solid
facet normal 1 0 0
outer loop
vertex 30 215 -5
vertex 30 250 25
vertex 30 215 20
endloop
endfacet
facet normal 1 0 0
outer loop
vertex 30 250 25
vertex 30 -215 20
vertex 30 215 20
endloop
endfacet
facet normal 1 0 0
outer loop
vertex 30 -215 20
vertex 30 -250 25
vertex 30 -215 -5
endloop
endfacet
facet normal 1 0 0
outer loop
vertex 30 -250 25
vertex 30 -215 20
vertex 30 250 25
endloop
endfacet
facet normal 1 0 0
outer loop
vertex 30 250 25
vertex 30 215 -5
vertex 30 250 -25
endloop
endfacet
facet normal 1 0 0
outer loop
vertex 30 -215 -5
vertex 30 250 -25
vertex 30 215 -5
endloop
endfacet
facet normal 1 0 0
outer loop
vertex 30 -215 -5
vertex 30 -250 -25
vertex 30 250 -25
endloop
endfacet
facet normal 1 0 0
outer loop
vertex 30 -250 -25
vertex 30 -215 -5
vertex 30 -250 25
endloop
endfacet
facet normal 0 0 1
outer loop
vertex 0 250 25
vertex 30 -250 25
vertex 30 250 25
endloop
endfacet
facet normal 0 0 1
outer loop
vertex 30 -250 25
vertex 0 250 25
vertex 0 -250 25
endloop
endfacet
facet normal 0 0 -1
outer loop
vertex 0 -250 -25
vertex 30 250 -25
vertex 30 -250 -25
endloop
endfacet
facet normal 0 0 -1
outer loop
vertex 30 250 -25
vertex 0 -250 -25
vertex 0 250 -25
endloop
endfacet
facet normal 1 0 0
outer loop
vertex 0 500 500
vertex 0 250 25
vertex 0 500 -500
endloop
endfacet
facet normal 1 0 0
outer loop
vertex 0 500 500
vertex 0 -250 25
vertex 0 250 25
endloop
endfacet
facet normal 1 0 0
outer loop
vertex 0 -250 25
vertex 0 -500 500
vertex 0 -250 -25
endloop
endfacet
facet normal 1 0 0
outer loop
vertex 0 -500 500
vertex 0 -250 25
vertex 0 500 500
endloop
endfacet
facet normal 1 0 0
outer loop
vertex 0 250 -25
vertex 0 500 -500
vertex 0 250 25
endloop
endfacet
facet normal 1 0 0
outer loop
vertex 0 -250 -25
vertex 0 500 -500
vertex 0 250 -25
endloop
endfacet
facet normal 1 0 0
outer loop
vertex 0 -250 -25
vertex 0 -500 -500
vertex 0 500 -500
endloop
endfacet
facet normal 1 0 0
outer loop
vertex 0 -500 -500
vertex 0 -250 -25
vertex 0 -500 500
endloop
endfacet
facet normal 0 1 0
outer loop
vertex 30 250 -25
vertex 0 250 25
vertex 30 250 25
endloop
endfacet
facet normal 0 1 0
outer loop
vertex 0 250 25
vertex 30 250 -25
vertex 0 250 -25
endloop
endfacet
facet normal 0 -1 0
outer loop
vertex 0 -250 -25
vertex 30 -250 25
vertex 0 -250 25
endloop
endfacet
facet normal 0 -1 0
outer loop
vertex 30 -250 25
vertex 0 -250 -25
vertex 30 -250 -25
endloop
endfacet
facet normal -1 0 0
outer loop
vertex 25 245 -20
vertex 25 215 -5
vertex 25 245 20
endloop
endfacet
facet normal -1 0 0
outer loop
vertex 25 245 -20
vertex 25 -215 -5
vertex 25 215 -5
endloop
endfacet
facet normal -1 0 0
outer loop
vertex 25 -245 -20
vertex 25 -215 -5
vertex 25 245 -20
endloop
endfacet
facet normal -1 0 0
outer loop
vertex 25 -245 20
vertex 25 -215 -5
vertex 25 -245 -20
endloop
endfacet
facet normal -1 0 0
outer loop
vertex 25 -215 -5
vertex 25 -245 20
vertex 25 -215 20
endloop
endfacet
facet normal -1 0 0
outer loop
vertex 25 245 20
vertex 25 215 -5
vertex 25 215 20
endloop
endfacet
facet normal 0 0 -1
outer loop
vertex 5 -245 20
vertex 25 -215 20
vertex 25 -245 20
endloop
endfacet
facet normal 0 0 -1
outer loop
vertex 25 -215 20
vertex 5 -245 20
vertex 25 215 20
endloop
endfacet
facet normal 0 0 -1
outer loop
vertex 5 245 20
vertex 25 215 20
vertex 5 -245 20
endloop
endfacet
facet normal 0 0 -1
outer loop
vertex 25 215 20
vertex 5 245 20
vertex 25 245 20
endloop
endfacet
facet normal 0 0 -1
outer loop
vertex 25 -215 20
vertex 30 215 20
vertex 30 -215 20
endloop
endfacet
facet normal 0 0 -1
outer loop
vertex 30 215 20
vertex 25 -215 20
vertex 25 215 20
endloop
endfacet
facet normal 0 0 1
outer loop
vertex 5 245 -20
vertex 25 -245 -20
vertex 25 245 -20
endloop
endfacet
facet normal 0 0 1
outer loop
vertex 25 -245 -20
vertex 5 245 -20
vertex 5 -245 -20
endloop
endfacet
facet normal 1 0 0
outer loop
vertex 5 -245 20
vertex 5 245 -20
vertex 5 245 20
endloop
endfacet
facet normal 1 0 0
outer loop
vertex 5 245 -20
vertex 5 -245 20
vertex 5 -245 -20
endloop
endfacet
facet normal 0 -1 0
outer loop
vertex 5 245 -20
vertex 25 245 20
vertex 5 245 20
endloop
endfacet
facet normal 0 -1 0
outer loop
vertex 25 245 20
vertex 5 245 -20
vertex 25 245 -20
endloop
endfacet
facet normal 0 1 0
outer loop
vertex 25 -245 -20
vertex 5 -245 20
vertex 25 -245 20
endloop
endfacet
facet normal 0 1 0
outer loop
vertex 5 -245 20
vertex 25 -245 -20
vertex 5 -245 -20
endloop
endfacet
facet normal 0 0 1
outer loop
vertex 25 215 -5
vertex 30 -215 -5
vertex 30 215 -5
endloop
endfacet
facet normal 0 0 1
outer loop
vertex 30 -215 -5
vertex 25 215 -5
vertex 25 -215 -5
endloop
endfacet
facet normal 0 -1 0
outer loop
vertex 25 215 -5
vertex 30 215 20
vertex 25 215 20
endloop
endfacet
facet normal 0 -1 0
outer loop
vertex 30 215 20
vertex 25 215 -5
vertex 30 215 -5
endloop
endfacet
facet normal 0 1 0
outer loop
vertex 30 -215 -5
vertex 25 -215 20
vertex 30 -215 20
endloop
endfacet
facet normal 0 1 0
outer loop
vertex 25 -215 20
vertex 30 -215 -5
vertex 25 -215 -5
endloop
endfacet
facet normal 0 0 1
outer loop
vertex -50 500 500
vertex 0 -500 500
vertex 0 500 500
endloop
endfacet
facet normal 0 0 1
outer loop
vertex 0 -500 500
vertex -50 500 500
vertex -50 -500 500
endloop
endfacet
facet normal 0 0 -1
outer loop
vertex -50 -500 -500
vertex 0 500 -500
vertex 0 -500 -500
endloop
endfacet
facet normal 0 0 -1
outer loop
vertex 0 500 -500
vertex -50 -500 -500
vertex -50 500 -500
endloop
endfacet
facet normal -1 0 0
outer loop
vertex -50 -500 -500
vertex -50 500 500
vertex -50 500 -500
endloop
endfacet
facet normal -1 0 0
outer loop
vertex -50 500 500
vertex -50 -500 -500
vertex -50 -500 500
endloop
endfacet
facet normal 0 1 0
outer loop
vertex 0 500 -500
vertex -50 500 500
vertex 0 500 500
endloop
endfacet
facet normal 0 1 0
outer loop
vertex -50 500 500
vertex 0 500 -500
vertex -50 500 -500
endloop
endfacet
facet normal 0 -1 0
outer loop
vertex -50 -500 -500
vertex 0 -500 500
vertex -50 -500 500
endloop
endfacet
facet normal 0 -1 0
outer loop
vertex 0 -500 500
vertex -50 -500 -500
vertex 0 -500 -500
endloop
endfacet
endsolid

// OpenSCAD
motorWidth = 30;

module wall () {
	depth = 50;

	color("white")
	translate([-(depth/2), 0, 0])
	cube(size=[depth, 1000, 1000], center=true);
}

module clock () {

	module hull () {

		height = 50;
		depth = 30;
		width = 500;
		thickness = 5;
		hollow = [
			depth - (2 * thickness),
			width - (2 * thickness),
			height - (2 * thickness)
		];

		windowHeight = height / 2;
		windowWidth = width - (2 * motorWidth) - (2 * thickness);

		translate([depth/2, 0, 0])
		difference () {
			cube(size=[depth, width, height], center=true);
			cube(size=hollow, center=true);
			translate([depth/2, 0, (height/2) - (windowHeight/2) - thickness])
			cube(size=[
					depth,
					windowWidth,
					windowHeight
				],
				center=true
			);
		}

	}

	hull();
}


wall();
clock();
